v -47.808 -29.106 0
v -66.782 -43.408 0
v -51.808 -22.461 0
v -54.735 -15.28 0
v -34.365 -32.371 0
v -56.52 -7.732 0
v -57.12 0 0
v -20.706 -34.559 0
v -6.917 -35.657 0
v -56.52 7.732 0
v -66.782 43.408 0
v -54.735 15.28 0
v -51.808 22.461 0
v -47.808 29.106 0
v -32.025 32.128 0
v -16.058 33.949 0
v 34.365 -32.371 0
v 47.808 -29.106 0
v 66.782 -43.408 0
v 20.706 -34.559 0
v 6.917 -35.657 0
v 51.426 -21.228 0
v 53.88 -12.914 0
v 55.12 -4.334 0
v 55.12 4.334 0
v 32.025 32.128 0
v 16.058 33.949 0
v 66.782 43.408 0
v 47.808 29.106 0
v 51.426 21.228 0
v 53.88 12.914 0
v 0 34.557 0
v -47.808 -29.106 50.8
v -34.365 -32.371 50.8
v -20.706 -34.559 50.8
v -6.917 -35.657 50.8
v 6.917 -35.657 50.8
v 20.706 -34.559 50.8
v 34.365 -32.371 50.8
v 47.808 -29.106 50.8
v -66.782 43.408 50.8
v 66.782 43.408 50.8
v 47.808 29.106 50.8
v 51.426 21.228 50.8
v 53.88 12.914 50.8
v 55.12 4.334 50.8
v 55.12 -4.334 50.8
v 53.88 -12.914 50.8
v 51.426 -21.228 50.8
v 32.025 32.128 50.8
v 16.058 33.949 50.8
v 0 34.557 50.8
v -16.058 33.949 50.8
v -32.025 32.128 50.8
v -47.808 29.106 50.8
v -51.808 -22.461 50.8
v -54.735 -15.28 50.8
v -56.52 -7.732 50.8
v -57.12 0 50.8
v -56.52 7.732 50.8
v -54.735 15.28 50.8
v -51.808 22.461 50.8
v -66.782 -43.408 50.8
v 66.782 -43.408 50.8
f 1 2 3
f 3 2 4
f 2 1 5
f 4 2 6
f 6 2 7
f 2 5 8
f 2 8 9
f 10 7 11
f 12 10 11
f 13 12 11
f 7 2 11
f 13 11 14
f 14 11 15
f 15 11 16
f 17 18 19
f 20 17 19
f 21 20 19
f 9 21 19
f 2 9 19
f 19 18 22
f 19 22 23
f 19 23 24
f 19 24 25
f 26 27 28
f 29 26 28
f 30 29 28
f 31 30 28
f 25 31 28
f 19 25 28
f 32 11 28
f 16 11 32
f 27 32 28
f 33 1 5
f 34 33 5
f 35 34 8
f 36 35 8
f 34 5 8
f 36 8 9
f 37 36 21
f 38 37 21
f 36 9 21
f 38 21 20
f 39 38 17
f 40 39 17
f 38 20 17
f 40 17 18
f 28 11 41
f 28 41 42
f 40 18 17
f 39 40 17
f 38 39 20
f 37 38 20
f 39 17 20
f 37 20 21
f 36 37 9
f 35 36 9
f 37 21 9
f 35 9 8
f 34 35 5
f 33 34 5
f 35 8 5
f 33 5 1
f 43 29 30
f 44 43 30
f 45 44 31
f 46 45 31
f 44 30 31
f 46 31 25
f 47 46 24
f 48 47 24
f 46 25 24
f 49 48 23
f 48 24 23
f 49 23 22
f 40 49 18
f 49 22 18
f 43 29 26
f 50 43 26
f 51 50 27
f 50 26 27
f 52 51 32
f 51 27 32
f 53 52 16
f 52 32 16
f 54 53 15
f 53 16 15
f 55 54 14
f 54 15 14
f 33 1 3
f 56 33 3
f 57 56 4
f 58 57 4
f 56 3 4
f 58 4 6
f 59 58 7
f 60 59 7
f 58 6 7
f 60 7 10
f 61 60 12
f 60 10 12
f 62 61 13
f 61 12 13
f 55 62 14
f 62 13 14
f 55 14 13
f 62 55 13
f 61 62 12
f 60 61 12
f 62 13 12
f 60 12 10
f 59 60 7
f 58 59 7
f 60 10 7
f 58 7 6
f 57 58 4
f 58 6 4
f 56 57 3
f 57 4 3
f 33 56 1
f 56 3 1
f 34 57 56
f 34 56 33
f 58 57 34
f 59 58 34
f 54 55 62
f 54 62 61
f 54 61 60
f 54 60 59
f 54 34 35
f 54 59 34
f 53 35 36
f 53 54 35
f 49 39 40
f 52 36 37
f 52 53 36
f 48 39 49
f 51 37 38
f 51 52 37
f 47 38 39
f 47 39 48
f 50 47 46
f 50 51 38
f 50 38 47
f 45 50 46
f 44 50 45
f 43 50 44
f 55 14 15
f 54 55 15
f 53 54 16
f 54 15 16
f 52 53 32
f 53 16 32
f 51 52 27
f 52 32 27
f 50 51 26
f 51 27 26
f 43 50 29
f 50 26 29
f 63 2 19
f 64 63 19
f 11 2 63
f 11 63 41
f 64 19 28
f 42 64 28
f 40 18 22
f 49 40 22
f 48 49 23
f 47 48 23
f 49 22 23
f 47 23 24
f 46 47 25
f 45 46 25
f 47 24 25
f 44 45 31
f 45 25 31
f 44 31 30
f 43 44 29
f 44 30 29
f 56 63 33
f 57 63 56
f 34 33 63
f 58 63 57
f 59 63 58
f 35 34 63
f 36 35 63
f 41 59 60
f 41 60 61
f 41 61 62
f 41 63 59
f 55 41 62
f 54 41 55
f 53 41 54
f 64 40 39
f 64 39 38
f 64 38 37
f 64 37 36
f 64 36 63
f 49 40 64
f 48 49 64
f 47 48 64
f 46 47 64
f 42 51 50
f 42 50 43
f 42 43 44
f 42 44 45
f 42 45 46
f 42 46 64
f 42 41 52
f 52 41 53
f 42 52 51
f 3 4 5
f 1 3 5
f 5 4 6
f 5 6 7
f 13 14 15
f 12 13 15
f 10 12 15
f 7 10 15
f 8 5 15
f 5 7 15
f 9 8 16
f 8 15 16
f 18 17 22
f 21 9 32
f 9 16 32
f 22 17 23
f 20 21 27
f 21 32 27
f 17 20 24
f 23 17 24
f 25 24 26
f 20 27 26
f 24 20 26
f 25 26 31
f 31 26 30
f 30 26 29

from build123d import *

# Parameters (mm, degrees)
F0_W     = 133.5640400648
F0_H     = 86.8166312575
F2_DEPTH = 50.8


# Not quite as in the source:
# - a feature of the source that left no trace in its solid (it failed there, or was rolled back) is left out


with BuildPart() as f2:
    # F0 (on Top) → F2 (new body)
    with BuildSketch(Plane.XY):
        Rectangle(F0_W, F0_H)
        with BuildLine():
            ThreePointArc((-47.8078350425, 29.1058067232), (0, 34.5567017881), (47.8078350425, 29.1058067232))
            ThreePointArc((47.8078350425, 29.1058067232), (55.2757817597, 0), (47.8078350425, -29.1058067232))
            ThreePointArc((47.8078350425, -29.1058067232), (0, -35.794125029), (-47.8078350425, -29.1058067232))
            ThreePointArc((-47.8078350425, -29.1058067232), (-57.1202847567, 0), (-47.8078350425, 29.1058067232))
        make_face(mode=Mode.SUBTRACT)
    extrude(amount=F2_DEPTH)


with BuildPart() as f2b:
    # F1 (on face) → F2, piece 2 (new body)
    with BuildSketch(Plane.XY):
        with BuildLine():
            ThreePointArc((47.8078350425, 29.1058067232), (0, 34.5567017881), (-47.8078350425, 29.1058067232))
            ThreePointArc((-47.8078350425, 29.1058067232), (-57.1202847567, 0), (-47.8078350425, -29.1058067232))
            ThreePointArc((-47.8078350425, -29.1058067232), (0, -35.794125029), (47.8078350425, -29.1058067232))
            ThreePointArc((47.8078350425, -29.1058067232), (55.2757817597, 0), (47.8078350425, 29.1058067232))
        make_face()
    extrude(amount=F2_DEPTH)


solid = Compound([f2.part, f2b.part])
